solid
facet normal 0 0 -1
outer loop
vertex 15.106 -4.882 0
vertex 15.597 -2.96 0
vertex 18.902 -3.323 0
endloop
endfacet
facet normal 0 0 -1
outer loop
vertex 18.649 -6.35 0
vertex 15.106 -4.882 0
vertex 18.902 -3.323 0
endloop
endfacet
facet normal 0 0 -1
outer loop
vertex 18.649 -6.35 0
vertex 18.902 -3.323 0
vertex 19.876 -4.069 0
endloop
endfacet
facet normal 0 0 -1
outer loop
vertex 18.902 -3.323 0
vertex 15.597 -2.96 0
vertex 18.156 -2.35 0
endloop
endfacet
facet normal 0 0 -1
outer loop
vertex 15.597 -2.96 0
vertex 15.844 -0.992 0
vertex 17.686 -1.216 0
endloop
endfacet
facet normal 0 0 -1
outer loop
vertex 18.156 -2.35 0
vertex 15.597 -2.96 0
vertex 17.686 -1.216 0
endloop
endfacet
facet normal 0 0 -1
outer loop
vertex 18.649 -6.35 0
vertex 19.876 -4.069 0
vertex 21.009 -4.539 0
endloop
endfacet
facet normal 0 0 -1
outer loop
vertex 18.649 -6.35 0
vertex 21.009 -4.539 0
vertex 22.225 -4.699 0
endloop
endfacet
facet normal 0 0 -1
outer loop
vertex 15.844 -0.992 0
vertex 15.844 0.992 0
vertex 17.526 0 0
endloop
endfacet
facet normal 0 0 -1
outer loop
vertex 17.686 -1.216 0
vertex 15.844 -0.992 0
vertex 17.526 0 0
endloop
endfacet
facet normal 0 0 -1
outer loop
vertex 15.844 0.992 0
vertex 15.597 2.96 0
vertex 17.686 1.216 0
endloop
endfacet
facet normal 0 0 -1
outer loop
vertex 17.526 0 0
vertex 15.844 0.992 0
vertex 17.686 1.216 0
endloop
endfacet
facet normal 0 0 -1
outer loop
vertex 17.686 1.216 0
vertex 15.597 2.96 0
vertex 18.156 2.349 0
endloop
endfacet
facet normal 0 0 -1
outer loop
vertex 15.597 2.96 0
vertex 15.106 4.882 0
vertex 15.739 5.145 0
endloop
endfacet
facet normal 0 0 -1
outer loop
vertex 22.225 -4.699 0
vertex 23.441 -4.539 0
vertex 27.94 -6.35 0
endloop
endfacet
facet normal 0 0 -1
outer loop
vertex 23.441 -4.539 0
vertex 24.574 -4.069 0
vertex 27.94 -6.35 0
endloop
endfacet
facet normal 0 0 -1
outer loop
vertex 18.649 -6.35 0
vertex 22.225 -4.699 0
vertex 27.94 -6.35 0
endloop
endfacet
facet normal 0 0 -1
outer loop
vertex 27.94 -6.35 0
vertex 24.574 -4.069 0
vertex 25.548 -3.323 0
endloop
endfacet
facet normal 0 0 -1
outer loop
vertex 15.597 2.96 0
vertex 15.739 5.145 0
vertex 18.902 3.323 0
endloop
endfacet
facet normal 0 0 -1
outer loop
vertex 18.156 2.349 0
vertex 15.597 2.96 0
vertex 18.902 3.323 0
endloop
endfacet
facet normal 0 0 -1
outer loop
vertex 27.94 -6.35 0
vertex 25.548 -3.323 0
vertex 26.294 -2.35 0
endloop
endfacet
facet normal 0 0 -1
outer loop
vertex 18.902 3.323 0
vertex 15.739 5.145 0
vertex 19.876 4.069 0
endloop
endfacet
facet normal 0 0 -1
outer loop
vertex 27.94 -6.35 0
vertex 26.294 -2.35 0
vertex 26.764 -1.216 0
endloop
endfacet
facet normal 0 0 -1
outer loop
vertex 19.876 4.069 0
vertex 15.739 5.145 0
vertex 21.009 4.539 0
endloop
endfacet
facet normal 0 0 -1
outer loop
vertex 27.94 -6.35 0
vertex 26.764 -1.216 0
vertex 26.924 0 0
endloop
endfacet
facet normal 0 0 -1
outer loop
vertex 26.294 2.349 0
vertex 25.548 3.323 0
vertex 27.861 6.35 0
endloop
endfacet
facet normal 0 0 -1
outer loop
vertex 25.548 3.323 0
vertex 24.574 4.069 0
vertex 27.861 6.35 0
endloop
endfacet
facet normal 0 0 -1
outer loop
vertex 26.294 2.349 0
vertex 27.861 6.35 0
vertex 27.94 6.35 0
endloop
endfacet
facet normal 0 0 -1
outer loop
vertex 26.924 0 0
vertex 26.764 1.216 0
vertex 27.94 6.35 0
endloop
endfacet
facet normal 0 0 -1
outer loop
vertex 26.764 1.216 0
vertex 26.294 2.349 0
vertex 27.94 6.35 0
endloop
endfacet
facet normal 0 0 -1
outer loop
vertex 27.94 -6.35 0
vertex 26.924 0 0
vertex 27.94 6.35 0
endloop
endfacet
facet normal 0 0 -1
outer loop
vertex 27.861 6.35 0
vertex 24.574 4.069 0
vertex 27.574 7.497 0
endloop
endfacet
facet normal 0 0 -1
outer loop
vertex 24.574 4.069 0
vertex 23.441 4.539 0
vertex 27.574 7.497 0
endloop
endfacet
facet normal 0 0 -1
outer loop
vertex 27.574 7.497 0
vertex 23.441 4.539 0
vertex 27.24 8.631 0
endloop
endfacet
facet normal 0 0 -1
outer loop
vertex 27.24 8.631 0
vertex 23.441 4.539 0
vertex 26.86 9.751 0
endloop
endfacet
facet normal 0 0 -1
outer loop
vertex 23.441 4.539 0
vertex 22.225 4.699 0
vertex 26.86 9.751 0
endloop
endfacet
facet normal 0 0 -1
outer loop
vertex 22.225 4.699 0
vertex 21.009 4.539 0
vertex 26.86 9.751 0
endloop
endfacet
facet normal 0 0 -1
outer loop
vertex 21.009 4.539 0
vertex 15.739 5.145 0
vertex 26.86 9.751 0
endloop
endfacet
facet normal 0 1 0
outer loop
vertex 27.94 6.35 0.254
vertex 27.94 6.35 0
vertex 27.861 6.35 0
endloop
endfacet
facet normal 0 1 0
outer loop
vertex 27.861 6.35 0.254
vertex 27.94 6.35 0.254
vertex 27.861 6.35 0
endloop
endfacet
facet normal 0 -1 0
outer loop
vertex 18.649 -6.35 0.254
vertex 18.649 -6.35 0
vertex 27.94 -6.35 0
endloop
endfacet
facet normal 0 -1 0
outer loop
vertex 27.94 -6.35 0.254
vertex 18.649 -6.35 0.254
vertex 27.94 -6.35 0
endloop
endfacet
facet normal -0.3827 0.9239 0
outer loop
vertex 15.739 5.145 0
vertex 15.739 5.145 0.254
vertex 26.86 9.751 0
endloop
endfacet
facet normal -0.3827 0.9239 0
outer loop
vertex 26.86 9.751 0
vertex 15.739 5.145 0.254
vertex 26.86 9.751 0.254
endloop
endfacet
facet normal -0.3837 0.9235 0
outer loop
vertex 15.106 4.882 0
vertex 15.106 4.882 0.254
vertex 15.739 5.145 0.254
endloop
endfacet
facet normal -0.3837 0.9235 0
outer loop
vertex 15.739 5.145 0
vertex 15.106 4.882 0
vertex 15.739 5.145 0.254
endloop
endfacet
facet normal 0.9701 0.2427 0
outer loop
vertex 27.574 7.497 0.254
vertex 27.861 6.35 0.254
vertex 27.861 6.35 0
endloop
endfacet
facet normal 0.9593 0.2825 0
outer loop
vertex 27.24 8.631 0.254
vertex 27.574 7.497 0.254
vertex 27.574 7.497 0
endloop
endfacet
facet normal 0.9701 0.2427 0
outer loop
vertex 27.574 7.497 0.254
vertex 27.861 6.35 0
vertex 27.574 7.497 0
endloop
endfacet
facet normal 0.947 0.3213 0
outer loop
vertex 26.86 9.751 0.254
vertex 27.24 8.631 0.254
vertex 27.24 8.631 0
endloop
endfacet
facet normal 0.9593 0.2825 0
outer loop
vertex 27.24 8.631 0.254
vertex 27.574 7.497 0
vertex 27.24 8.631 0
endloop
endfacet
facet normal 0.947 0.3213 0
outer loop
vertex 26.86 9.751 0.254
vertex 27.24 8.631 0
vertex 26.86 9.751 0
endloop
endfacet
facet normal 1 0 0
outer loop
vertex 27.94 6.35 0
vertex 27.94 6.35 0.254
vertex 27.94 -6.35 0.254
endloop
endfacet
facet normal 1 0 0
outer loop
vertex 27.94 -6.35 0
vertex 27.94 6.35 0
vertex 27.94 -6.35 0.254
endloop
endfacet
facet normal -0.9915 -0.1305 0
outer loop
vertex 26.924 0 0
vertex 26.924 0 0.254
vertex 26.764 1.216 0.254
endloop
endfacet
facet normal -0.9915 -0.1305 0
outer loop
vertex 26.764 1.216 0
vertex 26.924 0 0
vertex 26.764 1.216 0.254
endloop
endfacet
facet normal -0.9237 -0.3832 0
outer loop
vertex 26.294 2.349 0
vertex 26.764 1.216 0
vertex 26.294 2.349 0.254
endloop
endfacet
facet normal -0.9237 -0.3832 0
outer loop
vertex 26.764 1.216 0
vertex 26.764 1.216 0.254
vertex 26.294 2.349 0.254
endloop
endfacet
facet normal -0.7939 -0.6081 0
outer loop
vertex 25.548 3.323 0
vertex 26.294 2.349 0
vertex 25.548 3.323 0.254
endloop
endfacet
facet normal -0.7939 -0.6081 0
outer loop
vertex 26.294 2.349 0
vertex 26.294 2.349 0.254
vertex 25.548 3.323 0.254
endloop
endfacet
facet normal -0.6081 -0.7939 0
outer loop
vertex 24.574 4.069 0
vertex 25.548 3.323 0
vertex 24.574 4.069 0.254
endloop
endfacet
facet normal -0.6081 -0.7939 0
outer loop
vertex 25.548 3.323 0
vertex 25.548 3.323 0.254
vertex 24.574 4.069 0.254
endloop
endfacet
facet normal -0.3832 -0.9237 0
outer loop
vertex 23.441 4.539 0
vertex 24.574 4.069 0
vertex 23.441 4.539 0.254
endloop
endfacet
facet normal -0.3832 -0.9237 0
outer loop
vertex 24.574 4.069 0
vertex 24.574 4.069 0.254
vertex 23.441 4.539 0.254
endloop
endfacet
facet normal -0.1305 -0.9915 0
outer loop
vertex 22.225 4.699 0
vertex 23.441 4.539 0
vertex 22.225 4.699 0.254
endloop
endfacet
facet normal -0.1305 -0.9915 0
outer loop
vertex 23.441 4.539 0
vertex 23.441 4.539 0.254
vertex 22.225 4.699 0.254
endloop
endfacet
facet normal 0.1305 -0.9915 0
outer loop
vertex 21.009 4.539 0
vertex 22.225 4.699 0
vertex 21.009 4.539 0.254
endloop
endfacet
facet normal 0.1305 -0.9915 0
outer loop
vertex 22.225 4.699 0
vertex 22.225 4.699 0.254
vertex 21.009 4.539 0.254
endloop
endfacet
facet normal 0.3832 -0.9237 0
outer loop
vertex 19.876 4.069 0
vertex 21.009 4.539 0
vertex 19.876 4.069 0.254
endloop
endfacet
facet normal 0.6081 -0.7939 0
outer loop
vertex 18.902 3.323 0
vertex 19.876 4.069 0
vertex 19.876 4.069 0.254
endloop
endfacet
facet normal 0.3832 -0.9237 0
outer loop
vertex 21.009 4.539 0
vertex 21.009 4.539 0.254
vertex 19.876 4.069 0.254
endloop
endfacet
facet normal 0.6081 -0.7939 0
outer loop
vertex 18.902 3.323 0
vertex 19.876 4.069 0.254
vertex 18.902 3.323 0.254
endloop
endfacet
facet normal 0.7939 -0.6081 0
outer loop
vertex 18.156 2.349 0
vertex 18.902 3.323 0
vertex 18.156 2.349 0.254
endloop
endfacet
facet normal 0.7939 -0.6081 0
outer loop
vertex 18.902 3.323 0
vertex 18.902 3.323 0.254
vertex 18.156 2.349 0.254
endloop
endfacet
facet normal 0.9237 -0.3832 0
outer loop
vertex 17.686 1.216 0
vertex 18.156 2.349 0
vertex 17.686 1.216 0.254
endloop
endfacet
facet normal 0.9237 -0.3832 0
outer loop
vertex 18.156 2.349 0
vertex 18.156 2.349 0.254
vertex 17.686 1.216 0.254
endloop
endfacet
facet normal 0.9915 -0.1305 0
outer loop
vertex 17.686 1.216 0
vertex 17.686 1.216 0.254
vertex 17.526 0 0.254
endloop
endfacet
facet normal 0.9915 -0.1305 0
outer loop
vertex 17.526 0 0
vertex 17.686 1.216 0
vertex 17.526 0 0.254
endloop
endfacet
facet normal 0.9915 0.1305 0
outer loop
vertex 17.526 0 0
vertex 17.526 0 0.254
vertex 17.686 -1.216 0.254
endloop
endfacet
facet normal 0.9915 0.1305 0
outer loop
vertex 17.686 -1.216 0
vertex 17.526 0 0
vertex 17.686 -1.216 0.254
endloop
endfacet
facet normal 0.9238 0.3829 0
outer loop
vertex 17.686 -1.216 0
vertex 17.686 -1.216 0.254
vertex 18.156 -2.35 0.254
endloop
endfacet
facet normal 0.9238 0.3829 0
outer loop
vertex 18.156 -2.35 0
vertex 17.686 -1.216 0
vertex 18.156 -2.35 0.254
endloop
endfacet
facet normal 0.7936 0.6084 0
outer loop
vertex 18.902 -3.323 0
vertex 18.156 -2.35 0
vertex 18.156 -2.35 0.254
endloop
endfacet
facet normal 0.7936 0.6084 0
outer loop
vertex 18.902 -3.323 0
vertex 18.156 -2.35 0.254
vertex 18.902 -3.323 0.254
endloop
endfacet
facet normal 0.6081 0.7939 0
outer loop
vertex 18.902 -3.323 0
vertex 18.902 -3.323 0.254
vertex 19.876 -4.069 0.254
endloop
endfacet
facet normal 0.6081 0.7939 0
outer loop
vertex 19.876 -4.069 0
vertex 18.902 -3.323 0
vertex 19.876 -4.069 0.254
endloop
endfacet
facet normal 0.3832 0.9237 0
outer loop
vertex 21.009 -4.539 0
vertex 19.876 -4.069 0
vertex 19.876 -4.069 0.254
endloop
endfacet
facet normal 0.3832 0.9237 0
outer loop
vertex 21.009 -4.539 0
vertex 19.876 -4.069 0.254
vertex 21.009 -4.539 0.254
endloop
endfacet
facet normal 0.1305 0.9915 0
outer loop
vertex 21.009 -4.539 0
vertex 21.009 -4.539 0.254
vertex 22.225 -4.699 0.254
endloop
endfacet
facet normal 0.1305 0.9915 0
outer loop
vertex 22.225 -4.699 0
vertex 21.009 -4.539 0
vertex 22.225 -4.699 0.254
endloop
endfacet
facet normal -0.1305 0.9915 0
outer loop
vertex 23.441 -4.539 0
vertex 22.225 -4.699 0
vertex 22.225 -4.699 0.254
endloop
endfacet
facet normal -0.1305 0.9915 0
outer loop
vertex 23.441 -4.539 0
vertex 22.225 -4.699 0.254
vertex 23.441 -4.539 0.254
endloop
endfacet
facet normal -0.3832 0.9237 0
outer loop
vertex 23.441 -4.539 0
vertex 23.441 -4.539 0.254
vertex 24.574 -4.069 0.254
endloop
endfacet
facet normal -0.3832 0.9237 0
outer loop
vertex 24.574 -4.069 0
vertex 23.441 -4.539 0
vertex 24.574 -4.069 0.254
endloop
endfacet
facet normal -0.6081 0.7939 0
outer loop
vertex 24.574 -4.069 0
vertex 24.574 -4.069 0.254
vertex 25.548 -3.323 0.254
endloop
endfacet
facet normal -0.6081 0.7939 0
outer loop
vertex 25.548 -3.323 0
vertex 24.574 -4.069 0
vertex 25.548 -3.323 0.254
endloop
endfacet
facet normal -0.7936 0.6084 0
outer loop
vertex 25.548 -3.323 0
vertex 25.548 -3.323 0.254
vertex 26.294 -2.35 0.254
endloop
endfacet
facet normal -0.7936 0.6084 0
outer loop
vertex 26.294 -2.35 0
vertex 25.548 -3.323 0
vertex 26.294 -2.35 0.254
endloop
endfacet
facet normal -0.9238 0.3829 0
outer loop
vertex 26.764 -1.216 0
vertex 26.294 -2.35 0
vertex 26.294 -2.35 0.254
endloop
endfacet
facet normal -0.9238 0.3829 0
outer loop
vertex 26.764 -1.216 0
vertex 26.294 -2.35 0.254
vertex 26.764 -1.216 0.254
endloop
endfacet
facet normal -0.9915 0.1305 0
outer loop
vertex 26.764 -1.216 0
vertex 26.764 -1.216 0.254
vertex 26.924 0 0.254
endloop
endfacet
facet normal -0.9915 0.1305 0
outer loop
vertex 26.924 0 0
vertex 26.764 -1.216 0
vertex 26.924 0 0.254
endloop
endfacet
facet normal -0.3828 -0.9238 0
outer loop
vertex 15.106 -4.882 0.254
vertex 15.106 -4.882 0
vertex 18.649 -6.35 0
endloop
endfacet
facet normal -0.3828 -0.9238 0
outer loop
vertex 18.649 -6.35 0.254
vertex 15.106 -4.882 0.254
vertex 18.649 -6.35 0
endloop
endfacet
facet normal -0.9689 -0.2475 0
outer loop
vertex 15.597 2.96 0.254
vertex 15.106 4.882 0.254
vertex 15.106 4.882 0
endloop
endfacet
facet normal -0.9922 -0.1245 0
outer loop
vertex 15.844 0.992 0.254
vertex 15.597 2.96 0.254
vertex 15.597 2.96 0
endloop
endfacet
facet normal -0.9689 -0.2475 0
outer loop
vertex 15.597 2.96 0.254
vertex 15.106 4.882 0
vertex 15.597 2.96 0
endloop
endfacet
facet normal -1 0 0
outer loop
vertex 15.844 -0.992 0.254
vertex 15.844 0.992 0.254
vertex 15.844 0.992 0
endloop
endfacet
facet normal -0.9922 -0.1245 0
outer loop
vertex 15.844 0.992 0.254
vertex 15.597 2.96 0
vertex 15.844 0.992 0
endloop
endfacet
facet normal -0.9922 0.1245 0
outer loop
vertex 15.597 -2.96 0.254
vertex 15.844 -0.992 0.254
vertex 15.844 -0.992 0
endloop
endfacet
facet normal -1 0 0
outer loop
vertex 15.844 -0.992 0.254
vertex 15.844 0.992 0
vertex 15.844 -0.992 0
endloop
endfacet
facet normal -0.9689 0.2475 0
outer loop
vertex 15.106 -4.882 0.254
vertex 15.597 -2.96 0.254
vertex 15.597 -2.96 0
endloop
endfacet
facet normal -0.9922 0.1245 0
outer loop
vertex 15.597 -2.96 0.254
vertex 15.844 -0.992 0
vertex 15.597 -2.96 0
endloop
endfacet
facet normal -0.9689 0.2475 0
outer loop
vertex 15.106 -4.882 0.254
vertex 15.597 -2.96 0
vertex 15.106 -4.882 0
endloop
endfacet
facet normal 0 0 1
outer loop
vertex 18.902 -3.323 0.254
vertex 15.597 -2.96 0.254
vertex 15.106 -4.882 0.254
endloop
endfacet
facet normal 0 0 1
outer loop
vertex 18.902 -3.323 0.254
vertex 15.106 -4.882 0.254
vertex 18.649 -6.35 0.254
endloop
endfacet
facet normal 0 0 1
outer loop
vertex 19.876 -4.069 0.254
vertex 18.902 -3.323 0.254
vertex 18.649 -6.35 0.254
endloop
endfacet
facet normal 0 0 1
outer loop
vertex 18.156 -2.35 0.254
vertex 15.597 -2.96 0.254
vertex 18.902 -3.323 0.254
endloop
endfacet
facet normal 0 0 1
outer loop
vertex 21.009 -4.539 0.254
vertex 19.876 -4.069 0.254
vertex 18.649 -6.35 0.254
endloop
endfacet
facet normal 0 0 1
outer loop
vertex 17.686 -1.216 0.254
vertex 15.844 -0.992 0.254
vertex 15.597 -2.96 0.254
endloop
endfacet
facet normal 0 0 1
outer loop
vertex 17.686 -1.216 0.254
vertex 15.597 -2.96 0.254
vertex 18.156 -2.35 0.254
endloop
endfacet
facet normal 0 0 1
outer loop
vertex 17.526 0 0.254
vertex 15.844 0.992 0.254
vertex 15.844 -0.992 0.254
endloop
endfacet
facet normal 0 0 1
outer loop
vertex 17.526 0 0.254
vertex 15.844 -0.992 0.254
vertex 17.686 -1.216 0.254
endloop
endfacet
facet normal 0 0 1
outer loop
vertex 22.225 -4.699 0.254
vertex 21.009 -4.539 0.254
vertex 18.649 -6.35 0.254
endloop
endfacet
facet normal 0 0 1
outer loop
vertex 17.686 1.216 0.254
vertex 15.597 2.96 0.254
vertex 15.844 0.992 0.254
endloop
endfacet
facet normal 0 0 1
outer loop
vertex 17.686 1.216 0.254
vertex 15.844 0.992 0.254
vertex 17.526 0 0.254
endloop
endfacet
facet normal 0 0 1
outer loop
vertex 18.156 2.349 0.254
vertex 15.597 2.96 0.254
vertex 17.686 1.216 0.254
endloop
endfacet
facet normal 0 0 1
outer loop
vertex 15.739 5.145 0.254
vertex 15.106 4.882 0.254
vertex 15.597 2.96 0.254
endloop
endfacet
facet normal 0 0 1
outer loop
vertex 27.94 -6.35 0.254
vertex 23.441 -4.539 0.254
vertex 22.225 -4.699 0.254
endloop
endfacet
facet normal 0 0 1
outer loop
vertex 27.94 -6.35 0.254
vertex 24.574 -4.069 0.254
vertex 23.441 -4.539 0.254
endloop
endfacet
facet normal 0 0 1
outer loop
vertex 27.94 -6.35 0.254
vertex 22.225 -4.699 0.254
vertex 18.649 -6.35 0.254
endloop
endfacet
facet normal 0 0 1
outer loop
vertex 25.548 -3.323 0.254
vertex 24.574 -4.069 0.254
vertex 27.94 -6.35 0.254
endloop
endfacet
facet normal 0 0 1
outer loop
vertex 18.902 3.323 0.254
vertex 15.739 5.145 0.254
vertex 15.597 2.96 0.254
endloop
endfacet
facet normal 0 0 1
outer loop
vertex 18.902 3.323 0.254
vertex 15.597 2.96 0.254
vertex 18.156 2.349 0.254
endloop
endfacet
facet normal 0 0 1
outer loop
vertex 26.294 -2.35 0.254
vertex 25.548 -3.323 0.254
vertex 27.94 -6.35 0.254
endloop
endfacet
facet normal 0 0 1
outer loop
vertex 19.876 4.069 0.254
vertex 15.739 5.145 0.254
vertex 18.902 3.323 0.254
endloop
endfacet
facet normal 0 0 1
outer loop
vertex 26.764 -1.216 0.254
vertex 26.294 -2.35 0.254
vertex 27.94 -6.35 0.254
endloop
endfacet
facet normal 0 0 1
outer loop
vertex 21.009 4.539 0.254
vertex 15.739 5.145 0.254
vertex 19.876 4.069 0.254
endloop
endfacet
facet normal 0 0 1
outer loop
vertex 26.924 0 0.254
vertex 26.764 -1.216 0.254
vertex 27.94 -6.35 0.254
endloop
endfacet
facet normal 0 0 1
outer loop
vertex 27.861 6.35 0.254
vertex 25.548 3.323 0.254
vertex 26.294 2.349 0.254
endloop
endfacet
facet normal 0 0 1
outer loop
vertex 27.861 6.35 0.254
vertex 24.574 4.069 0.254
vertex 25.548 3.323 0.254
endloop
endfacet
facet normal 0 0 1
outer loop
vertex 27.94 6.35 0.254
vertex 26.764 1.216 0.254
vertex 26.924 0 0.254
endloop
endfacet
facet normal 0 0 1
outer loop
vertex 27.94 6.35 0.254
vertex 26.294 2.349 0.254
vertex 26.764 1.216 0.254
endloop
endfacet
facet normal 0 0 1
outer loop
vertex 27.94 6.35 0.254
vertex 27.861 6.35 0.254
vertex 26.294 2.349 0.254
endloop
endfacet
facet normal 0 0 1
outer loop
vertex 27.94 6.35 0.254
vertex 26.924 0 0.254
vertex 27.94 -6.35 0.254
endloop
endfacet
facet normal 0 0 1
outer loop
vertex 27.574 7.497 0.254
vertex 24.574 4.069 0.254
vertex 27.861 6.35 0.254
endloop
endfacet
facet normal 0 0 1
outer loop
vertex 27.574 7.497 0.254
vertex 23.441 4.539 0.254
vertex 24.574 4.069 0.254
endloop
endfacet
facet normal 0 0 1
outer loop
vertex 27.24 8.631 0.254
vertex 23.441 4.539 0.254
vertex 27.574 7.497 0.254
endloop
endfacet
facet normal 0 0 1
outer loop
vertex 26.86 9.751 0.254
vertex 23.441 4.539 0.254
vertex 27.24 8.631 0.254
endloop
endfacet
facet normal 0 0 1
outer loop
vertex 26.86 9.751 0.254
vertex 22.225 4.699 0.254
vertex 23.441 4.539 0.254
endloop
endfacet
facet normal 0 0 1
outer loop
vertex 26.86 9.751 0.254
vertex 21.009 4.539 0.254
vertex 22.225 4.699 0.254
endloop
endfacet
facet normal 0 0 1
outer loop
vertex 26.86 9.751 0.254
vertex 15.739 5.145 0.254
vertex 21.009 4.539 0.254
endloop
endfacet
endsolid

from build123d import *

# Parameters (mm, degrees)
BOSS_EXTRUDE1_DEPTH = 0.254
SKETCH2_R           = 4.699
CUT_EXTRUDE1_DEPTH  = 1.254
SKETCH3_W           = 2.54
SKETCH3_H           = 0.635
CUT_EXTRUDE2_DEPTH  = 1.254
SKETCH5_OUTSIDE_W   = 121.447
SKETCH5_OUTSIDE_H   = 109.618
CUT_EXTRUDE5_DEPTH  = 1.254


with BuildPart() as part:
    # Sketch1 → Boss-Extrude1 (new body)
    with BuildSketch(Plane.XY):
        with BuildLine():
            Line((67.21146711, 76.191723231), (8.696654013, 17.676910134))
            Line((8.696654013, 17.676910134), (7.228954972, 14.133571205))
            ThreePointArc((7.228954972, 14.133571205), (14.666587579, 6.075099489), (15.105587123, -4.88230096))
            Line((15.105587123, -4.88230096), (18.648926052, -6.35))
            Line((18.648926052, -6.35), (101.401368334, -6.35))
            ThreePointArc((101.401368334, -6.35), (93.866160503, 38.880636728), (67.21146711, 76.191723231))
        make_face()
        with BuildLine():
            Line((88.672924278, 6.35), (27.86051193, 6.35))
            ThreePointArc((27.86051193, 6.35), (26.399857642, 10.93517908), (24.190484974, 15.210228852))
            Line((24.190484974, 15.210228852), (67.191354125, 58.211098004))
            ThreePointArc((67.191354125, 58.211098004), (82.13289044, 34.020557137), (88.672924278, 6.35))
        make_face(mode=Mode.SUBTRACT)
    extrude(amount=BOSS_EXTRUDE1_DEPTH)

    # Sketch2 → Cut-Extrude1 (cut, through all)
    with BuildSketch(Plane.XY.offset(0.254)):
        with Locations((22.225, 0)):
            Circle(SKETCH2_R)
        with Locations((36.195, 0)):
            Circle(SKETCH2_R)
        with Locations((61.722, 0)):
            Circle(SKETCH2_R)
        with Locations((75.692, 0)):
            Circle(SKETCH2_R)
        with Locations((95.25, 0)):
            Circle(SKETCH2_R)
        with Locations((15.715448212, 15.715448212)):
            Circle(SKETCH2_R)
        with Locations((25.593729945, 25.593729945)):
            Circle(SKETCH2_R)
        with Locations((43.644044748, 43.644044748)):
            Circle(SKETCH2_R)
        with Locations((53.522326482, 53.522326482)):
            Circle(SKETCH2_R)
        with Locations((92.004434954, 24.652514046)):
            Circle(SKETCH2_R)
        with Locations((82.48891971, 47.625)):
            Circle(SKETCH2_R)
        with Locations((67.351920908, 67.351920908)):
            Circle(SKETCH2_R)
    extrude(amount=-CUT_EXTRUDE1_DEPTH, mode=Mode.SUBTRACT)

    # Sketch3 → Cut-Extrude2 (cut, through all)
    with BuildSketch(Plane.XY.offset(0.254)):
        Polygon((15.266435406, 24.246691527), (17.06248663, 26.042742751), (17.511499436, 25.593729945), (15.715448212, 23.797678721), align=None)
        Polygon((44.991083167, 53.971339288), (43.195031942, 52.175288063), (43.644044748, 51.726275257), (45.440095973, 53.522326482), align=None)
        with Locations((29.21, -6.0325)):
            Rectangle(SKETCH3_W, SKETCH3_H)
        with Locations((68.707, -6.0325)):
            Rectangle(SKETCH3_W, SKETCH3_H)
        Polygon((29.230733674, 38.210989795), (31.026784898, 40.007041019), (31.475797704, 39.558028213), (29.67974648, 37.761976989), align=None)
        Polygon((56.845021246, 65.825277367), (55.048970022, 64.029226143), (55.497982828, 63.580213337), (57.294034052, 65.376264561), align=None)
        with Locations((48.9585, -6.0325)):
            Rectangle(SKETCH3_W, SKETCH3_H)
        with Locations((85.471, -6.0325)):
            Rectangle(SKETCH3_W, SKETCH3_H)
        Polygon((99.935462164, 14.437711971), (100.266998693, 11.919442024), (101.526133667, 12.085210288), (101.194597138, 14.603480236), align=None)
        Polygon((93.765504959, 37.464305742), (94.938831965, 37.950313702), (93.966816047, 40.296967714), (92.793489041, 39.810959755), align=None)
        Polygon((79.327792988, 62.471156422), (80.874047017, 60.456038938), (81.88160576, 61.229165953), (80.33535173, 63.244283437), align=None)
        Polygon((13.593916116, 7.005422516), (14.565932035, 4.658768503), (15.739259041, 5.144776462), (14.767243123, 7.491430475), align=None)
    extrude(amount=-CUT_EXTRUDE2_DEPTH, mode=Mode.SUBTRACT)

    # Sketch5 outside → Cut-Extrude5 (cut, through all)
    with BuildSketch(Plane.XY.offset(0.254)):
        with Locations((54.4145, 34.921)):
            Rectangle(SKETCH5_OUTSIDE_W, SKETCH5_OUTSIDE_H)
        Polygon((11.513421912, 3.394377411), (27.94, 10.198488838), (27.94, -7.62), (11.513421912, -7.62), align=None, mode=Mode.SUBTRACT)
    extrude(amount=-CUT_EXTRUDE5_DEPTH, mode=Mode.SUBTRACT)


solid = part.part
